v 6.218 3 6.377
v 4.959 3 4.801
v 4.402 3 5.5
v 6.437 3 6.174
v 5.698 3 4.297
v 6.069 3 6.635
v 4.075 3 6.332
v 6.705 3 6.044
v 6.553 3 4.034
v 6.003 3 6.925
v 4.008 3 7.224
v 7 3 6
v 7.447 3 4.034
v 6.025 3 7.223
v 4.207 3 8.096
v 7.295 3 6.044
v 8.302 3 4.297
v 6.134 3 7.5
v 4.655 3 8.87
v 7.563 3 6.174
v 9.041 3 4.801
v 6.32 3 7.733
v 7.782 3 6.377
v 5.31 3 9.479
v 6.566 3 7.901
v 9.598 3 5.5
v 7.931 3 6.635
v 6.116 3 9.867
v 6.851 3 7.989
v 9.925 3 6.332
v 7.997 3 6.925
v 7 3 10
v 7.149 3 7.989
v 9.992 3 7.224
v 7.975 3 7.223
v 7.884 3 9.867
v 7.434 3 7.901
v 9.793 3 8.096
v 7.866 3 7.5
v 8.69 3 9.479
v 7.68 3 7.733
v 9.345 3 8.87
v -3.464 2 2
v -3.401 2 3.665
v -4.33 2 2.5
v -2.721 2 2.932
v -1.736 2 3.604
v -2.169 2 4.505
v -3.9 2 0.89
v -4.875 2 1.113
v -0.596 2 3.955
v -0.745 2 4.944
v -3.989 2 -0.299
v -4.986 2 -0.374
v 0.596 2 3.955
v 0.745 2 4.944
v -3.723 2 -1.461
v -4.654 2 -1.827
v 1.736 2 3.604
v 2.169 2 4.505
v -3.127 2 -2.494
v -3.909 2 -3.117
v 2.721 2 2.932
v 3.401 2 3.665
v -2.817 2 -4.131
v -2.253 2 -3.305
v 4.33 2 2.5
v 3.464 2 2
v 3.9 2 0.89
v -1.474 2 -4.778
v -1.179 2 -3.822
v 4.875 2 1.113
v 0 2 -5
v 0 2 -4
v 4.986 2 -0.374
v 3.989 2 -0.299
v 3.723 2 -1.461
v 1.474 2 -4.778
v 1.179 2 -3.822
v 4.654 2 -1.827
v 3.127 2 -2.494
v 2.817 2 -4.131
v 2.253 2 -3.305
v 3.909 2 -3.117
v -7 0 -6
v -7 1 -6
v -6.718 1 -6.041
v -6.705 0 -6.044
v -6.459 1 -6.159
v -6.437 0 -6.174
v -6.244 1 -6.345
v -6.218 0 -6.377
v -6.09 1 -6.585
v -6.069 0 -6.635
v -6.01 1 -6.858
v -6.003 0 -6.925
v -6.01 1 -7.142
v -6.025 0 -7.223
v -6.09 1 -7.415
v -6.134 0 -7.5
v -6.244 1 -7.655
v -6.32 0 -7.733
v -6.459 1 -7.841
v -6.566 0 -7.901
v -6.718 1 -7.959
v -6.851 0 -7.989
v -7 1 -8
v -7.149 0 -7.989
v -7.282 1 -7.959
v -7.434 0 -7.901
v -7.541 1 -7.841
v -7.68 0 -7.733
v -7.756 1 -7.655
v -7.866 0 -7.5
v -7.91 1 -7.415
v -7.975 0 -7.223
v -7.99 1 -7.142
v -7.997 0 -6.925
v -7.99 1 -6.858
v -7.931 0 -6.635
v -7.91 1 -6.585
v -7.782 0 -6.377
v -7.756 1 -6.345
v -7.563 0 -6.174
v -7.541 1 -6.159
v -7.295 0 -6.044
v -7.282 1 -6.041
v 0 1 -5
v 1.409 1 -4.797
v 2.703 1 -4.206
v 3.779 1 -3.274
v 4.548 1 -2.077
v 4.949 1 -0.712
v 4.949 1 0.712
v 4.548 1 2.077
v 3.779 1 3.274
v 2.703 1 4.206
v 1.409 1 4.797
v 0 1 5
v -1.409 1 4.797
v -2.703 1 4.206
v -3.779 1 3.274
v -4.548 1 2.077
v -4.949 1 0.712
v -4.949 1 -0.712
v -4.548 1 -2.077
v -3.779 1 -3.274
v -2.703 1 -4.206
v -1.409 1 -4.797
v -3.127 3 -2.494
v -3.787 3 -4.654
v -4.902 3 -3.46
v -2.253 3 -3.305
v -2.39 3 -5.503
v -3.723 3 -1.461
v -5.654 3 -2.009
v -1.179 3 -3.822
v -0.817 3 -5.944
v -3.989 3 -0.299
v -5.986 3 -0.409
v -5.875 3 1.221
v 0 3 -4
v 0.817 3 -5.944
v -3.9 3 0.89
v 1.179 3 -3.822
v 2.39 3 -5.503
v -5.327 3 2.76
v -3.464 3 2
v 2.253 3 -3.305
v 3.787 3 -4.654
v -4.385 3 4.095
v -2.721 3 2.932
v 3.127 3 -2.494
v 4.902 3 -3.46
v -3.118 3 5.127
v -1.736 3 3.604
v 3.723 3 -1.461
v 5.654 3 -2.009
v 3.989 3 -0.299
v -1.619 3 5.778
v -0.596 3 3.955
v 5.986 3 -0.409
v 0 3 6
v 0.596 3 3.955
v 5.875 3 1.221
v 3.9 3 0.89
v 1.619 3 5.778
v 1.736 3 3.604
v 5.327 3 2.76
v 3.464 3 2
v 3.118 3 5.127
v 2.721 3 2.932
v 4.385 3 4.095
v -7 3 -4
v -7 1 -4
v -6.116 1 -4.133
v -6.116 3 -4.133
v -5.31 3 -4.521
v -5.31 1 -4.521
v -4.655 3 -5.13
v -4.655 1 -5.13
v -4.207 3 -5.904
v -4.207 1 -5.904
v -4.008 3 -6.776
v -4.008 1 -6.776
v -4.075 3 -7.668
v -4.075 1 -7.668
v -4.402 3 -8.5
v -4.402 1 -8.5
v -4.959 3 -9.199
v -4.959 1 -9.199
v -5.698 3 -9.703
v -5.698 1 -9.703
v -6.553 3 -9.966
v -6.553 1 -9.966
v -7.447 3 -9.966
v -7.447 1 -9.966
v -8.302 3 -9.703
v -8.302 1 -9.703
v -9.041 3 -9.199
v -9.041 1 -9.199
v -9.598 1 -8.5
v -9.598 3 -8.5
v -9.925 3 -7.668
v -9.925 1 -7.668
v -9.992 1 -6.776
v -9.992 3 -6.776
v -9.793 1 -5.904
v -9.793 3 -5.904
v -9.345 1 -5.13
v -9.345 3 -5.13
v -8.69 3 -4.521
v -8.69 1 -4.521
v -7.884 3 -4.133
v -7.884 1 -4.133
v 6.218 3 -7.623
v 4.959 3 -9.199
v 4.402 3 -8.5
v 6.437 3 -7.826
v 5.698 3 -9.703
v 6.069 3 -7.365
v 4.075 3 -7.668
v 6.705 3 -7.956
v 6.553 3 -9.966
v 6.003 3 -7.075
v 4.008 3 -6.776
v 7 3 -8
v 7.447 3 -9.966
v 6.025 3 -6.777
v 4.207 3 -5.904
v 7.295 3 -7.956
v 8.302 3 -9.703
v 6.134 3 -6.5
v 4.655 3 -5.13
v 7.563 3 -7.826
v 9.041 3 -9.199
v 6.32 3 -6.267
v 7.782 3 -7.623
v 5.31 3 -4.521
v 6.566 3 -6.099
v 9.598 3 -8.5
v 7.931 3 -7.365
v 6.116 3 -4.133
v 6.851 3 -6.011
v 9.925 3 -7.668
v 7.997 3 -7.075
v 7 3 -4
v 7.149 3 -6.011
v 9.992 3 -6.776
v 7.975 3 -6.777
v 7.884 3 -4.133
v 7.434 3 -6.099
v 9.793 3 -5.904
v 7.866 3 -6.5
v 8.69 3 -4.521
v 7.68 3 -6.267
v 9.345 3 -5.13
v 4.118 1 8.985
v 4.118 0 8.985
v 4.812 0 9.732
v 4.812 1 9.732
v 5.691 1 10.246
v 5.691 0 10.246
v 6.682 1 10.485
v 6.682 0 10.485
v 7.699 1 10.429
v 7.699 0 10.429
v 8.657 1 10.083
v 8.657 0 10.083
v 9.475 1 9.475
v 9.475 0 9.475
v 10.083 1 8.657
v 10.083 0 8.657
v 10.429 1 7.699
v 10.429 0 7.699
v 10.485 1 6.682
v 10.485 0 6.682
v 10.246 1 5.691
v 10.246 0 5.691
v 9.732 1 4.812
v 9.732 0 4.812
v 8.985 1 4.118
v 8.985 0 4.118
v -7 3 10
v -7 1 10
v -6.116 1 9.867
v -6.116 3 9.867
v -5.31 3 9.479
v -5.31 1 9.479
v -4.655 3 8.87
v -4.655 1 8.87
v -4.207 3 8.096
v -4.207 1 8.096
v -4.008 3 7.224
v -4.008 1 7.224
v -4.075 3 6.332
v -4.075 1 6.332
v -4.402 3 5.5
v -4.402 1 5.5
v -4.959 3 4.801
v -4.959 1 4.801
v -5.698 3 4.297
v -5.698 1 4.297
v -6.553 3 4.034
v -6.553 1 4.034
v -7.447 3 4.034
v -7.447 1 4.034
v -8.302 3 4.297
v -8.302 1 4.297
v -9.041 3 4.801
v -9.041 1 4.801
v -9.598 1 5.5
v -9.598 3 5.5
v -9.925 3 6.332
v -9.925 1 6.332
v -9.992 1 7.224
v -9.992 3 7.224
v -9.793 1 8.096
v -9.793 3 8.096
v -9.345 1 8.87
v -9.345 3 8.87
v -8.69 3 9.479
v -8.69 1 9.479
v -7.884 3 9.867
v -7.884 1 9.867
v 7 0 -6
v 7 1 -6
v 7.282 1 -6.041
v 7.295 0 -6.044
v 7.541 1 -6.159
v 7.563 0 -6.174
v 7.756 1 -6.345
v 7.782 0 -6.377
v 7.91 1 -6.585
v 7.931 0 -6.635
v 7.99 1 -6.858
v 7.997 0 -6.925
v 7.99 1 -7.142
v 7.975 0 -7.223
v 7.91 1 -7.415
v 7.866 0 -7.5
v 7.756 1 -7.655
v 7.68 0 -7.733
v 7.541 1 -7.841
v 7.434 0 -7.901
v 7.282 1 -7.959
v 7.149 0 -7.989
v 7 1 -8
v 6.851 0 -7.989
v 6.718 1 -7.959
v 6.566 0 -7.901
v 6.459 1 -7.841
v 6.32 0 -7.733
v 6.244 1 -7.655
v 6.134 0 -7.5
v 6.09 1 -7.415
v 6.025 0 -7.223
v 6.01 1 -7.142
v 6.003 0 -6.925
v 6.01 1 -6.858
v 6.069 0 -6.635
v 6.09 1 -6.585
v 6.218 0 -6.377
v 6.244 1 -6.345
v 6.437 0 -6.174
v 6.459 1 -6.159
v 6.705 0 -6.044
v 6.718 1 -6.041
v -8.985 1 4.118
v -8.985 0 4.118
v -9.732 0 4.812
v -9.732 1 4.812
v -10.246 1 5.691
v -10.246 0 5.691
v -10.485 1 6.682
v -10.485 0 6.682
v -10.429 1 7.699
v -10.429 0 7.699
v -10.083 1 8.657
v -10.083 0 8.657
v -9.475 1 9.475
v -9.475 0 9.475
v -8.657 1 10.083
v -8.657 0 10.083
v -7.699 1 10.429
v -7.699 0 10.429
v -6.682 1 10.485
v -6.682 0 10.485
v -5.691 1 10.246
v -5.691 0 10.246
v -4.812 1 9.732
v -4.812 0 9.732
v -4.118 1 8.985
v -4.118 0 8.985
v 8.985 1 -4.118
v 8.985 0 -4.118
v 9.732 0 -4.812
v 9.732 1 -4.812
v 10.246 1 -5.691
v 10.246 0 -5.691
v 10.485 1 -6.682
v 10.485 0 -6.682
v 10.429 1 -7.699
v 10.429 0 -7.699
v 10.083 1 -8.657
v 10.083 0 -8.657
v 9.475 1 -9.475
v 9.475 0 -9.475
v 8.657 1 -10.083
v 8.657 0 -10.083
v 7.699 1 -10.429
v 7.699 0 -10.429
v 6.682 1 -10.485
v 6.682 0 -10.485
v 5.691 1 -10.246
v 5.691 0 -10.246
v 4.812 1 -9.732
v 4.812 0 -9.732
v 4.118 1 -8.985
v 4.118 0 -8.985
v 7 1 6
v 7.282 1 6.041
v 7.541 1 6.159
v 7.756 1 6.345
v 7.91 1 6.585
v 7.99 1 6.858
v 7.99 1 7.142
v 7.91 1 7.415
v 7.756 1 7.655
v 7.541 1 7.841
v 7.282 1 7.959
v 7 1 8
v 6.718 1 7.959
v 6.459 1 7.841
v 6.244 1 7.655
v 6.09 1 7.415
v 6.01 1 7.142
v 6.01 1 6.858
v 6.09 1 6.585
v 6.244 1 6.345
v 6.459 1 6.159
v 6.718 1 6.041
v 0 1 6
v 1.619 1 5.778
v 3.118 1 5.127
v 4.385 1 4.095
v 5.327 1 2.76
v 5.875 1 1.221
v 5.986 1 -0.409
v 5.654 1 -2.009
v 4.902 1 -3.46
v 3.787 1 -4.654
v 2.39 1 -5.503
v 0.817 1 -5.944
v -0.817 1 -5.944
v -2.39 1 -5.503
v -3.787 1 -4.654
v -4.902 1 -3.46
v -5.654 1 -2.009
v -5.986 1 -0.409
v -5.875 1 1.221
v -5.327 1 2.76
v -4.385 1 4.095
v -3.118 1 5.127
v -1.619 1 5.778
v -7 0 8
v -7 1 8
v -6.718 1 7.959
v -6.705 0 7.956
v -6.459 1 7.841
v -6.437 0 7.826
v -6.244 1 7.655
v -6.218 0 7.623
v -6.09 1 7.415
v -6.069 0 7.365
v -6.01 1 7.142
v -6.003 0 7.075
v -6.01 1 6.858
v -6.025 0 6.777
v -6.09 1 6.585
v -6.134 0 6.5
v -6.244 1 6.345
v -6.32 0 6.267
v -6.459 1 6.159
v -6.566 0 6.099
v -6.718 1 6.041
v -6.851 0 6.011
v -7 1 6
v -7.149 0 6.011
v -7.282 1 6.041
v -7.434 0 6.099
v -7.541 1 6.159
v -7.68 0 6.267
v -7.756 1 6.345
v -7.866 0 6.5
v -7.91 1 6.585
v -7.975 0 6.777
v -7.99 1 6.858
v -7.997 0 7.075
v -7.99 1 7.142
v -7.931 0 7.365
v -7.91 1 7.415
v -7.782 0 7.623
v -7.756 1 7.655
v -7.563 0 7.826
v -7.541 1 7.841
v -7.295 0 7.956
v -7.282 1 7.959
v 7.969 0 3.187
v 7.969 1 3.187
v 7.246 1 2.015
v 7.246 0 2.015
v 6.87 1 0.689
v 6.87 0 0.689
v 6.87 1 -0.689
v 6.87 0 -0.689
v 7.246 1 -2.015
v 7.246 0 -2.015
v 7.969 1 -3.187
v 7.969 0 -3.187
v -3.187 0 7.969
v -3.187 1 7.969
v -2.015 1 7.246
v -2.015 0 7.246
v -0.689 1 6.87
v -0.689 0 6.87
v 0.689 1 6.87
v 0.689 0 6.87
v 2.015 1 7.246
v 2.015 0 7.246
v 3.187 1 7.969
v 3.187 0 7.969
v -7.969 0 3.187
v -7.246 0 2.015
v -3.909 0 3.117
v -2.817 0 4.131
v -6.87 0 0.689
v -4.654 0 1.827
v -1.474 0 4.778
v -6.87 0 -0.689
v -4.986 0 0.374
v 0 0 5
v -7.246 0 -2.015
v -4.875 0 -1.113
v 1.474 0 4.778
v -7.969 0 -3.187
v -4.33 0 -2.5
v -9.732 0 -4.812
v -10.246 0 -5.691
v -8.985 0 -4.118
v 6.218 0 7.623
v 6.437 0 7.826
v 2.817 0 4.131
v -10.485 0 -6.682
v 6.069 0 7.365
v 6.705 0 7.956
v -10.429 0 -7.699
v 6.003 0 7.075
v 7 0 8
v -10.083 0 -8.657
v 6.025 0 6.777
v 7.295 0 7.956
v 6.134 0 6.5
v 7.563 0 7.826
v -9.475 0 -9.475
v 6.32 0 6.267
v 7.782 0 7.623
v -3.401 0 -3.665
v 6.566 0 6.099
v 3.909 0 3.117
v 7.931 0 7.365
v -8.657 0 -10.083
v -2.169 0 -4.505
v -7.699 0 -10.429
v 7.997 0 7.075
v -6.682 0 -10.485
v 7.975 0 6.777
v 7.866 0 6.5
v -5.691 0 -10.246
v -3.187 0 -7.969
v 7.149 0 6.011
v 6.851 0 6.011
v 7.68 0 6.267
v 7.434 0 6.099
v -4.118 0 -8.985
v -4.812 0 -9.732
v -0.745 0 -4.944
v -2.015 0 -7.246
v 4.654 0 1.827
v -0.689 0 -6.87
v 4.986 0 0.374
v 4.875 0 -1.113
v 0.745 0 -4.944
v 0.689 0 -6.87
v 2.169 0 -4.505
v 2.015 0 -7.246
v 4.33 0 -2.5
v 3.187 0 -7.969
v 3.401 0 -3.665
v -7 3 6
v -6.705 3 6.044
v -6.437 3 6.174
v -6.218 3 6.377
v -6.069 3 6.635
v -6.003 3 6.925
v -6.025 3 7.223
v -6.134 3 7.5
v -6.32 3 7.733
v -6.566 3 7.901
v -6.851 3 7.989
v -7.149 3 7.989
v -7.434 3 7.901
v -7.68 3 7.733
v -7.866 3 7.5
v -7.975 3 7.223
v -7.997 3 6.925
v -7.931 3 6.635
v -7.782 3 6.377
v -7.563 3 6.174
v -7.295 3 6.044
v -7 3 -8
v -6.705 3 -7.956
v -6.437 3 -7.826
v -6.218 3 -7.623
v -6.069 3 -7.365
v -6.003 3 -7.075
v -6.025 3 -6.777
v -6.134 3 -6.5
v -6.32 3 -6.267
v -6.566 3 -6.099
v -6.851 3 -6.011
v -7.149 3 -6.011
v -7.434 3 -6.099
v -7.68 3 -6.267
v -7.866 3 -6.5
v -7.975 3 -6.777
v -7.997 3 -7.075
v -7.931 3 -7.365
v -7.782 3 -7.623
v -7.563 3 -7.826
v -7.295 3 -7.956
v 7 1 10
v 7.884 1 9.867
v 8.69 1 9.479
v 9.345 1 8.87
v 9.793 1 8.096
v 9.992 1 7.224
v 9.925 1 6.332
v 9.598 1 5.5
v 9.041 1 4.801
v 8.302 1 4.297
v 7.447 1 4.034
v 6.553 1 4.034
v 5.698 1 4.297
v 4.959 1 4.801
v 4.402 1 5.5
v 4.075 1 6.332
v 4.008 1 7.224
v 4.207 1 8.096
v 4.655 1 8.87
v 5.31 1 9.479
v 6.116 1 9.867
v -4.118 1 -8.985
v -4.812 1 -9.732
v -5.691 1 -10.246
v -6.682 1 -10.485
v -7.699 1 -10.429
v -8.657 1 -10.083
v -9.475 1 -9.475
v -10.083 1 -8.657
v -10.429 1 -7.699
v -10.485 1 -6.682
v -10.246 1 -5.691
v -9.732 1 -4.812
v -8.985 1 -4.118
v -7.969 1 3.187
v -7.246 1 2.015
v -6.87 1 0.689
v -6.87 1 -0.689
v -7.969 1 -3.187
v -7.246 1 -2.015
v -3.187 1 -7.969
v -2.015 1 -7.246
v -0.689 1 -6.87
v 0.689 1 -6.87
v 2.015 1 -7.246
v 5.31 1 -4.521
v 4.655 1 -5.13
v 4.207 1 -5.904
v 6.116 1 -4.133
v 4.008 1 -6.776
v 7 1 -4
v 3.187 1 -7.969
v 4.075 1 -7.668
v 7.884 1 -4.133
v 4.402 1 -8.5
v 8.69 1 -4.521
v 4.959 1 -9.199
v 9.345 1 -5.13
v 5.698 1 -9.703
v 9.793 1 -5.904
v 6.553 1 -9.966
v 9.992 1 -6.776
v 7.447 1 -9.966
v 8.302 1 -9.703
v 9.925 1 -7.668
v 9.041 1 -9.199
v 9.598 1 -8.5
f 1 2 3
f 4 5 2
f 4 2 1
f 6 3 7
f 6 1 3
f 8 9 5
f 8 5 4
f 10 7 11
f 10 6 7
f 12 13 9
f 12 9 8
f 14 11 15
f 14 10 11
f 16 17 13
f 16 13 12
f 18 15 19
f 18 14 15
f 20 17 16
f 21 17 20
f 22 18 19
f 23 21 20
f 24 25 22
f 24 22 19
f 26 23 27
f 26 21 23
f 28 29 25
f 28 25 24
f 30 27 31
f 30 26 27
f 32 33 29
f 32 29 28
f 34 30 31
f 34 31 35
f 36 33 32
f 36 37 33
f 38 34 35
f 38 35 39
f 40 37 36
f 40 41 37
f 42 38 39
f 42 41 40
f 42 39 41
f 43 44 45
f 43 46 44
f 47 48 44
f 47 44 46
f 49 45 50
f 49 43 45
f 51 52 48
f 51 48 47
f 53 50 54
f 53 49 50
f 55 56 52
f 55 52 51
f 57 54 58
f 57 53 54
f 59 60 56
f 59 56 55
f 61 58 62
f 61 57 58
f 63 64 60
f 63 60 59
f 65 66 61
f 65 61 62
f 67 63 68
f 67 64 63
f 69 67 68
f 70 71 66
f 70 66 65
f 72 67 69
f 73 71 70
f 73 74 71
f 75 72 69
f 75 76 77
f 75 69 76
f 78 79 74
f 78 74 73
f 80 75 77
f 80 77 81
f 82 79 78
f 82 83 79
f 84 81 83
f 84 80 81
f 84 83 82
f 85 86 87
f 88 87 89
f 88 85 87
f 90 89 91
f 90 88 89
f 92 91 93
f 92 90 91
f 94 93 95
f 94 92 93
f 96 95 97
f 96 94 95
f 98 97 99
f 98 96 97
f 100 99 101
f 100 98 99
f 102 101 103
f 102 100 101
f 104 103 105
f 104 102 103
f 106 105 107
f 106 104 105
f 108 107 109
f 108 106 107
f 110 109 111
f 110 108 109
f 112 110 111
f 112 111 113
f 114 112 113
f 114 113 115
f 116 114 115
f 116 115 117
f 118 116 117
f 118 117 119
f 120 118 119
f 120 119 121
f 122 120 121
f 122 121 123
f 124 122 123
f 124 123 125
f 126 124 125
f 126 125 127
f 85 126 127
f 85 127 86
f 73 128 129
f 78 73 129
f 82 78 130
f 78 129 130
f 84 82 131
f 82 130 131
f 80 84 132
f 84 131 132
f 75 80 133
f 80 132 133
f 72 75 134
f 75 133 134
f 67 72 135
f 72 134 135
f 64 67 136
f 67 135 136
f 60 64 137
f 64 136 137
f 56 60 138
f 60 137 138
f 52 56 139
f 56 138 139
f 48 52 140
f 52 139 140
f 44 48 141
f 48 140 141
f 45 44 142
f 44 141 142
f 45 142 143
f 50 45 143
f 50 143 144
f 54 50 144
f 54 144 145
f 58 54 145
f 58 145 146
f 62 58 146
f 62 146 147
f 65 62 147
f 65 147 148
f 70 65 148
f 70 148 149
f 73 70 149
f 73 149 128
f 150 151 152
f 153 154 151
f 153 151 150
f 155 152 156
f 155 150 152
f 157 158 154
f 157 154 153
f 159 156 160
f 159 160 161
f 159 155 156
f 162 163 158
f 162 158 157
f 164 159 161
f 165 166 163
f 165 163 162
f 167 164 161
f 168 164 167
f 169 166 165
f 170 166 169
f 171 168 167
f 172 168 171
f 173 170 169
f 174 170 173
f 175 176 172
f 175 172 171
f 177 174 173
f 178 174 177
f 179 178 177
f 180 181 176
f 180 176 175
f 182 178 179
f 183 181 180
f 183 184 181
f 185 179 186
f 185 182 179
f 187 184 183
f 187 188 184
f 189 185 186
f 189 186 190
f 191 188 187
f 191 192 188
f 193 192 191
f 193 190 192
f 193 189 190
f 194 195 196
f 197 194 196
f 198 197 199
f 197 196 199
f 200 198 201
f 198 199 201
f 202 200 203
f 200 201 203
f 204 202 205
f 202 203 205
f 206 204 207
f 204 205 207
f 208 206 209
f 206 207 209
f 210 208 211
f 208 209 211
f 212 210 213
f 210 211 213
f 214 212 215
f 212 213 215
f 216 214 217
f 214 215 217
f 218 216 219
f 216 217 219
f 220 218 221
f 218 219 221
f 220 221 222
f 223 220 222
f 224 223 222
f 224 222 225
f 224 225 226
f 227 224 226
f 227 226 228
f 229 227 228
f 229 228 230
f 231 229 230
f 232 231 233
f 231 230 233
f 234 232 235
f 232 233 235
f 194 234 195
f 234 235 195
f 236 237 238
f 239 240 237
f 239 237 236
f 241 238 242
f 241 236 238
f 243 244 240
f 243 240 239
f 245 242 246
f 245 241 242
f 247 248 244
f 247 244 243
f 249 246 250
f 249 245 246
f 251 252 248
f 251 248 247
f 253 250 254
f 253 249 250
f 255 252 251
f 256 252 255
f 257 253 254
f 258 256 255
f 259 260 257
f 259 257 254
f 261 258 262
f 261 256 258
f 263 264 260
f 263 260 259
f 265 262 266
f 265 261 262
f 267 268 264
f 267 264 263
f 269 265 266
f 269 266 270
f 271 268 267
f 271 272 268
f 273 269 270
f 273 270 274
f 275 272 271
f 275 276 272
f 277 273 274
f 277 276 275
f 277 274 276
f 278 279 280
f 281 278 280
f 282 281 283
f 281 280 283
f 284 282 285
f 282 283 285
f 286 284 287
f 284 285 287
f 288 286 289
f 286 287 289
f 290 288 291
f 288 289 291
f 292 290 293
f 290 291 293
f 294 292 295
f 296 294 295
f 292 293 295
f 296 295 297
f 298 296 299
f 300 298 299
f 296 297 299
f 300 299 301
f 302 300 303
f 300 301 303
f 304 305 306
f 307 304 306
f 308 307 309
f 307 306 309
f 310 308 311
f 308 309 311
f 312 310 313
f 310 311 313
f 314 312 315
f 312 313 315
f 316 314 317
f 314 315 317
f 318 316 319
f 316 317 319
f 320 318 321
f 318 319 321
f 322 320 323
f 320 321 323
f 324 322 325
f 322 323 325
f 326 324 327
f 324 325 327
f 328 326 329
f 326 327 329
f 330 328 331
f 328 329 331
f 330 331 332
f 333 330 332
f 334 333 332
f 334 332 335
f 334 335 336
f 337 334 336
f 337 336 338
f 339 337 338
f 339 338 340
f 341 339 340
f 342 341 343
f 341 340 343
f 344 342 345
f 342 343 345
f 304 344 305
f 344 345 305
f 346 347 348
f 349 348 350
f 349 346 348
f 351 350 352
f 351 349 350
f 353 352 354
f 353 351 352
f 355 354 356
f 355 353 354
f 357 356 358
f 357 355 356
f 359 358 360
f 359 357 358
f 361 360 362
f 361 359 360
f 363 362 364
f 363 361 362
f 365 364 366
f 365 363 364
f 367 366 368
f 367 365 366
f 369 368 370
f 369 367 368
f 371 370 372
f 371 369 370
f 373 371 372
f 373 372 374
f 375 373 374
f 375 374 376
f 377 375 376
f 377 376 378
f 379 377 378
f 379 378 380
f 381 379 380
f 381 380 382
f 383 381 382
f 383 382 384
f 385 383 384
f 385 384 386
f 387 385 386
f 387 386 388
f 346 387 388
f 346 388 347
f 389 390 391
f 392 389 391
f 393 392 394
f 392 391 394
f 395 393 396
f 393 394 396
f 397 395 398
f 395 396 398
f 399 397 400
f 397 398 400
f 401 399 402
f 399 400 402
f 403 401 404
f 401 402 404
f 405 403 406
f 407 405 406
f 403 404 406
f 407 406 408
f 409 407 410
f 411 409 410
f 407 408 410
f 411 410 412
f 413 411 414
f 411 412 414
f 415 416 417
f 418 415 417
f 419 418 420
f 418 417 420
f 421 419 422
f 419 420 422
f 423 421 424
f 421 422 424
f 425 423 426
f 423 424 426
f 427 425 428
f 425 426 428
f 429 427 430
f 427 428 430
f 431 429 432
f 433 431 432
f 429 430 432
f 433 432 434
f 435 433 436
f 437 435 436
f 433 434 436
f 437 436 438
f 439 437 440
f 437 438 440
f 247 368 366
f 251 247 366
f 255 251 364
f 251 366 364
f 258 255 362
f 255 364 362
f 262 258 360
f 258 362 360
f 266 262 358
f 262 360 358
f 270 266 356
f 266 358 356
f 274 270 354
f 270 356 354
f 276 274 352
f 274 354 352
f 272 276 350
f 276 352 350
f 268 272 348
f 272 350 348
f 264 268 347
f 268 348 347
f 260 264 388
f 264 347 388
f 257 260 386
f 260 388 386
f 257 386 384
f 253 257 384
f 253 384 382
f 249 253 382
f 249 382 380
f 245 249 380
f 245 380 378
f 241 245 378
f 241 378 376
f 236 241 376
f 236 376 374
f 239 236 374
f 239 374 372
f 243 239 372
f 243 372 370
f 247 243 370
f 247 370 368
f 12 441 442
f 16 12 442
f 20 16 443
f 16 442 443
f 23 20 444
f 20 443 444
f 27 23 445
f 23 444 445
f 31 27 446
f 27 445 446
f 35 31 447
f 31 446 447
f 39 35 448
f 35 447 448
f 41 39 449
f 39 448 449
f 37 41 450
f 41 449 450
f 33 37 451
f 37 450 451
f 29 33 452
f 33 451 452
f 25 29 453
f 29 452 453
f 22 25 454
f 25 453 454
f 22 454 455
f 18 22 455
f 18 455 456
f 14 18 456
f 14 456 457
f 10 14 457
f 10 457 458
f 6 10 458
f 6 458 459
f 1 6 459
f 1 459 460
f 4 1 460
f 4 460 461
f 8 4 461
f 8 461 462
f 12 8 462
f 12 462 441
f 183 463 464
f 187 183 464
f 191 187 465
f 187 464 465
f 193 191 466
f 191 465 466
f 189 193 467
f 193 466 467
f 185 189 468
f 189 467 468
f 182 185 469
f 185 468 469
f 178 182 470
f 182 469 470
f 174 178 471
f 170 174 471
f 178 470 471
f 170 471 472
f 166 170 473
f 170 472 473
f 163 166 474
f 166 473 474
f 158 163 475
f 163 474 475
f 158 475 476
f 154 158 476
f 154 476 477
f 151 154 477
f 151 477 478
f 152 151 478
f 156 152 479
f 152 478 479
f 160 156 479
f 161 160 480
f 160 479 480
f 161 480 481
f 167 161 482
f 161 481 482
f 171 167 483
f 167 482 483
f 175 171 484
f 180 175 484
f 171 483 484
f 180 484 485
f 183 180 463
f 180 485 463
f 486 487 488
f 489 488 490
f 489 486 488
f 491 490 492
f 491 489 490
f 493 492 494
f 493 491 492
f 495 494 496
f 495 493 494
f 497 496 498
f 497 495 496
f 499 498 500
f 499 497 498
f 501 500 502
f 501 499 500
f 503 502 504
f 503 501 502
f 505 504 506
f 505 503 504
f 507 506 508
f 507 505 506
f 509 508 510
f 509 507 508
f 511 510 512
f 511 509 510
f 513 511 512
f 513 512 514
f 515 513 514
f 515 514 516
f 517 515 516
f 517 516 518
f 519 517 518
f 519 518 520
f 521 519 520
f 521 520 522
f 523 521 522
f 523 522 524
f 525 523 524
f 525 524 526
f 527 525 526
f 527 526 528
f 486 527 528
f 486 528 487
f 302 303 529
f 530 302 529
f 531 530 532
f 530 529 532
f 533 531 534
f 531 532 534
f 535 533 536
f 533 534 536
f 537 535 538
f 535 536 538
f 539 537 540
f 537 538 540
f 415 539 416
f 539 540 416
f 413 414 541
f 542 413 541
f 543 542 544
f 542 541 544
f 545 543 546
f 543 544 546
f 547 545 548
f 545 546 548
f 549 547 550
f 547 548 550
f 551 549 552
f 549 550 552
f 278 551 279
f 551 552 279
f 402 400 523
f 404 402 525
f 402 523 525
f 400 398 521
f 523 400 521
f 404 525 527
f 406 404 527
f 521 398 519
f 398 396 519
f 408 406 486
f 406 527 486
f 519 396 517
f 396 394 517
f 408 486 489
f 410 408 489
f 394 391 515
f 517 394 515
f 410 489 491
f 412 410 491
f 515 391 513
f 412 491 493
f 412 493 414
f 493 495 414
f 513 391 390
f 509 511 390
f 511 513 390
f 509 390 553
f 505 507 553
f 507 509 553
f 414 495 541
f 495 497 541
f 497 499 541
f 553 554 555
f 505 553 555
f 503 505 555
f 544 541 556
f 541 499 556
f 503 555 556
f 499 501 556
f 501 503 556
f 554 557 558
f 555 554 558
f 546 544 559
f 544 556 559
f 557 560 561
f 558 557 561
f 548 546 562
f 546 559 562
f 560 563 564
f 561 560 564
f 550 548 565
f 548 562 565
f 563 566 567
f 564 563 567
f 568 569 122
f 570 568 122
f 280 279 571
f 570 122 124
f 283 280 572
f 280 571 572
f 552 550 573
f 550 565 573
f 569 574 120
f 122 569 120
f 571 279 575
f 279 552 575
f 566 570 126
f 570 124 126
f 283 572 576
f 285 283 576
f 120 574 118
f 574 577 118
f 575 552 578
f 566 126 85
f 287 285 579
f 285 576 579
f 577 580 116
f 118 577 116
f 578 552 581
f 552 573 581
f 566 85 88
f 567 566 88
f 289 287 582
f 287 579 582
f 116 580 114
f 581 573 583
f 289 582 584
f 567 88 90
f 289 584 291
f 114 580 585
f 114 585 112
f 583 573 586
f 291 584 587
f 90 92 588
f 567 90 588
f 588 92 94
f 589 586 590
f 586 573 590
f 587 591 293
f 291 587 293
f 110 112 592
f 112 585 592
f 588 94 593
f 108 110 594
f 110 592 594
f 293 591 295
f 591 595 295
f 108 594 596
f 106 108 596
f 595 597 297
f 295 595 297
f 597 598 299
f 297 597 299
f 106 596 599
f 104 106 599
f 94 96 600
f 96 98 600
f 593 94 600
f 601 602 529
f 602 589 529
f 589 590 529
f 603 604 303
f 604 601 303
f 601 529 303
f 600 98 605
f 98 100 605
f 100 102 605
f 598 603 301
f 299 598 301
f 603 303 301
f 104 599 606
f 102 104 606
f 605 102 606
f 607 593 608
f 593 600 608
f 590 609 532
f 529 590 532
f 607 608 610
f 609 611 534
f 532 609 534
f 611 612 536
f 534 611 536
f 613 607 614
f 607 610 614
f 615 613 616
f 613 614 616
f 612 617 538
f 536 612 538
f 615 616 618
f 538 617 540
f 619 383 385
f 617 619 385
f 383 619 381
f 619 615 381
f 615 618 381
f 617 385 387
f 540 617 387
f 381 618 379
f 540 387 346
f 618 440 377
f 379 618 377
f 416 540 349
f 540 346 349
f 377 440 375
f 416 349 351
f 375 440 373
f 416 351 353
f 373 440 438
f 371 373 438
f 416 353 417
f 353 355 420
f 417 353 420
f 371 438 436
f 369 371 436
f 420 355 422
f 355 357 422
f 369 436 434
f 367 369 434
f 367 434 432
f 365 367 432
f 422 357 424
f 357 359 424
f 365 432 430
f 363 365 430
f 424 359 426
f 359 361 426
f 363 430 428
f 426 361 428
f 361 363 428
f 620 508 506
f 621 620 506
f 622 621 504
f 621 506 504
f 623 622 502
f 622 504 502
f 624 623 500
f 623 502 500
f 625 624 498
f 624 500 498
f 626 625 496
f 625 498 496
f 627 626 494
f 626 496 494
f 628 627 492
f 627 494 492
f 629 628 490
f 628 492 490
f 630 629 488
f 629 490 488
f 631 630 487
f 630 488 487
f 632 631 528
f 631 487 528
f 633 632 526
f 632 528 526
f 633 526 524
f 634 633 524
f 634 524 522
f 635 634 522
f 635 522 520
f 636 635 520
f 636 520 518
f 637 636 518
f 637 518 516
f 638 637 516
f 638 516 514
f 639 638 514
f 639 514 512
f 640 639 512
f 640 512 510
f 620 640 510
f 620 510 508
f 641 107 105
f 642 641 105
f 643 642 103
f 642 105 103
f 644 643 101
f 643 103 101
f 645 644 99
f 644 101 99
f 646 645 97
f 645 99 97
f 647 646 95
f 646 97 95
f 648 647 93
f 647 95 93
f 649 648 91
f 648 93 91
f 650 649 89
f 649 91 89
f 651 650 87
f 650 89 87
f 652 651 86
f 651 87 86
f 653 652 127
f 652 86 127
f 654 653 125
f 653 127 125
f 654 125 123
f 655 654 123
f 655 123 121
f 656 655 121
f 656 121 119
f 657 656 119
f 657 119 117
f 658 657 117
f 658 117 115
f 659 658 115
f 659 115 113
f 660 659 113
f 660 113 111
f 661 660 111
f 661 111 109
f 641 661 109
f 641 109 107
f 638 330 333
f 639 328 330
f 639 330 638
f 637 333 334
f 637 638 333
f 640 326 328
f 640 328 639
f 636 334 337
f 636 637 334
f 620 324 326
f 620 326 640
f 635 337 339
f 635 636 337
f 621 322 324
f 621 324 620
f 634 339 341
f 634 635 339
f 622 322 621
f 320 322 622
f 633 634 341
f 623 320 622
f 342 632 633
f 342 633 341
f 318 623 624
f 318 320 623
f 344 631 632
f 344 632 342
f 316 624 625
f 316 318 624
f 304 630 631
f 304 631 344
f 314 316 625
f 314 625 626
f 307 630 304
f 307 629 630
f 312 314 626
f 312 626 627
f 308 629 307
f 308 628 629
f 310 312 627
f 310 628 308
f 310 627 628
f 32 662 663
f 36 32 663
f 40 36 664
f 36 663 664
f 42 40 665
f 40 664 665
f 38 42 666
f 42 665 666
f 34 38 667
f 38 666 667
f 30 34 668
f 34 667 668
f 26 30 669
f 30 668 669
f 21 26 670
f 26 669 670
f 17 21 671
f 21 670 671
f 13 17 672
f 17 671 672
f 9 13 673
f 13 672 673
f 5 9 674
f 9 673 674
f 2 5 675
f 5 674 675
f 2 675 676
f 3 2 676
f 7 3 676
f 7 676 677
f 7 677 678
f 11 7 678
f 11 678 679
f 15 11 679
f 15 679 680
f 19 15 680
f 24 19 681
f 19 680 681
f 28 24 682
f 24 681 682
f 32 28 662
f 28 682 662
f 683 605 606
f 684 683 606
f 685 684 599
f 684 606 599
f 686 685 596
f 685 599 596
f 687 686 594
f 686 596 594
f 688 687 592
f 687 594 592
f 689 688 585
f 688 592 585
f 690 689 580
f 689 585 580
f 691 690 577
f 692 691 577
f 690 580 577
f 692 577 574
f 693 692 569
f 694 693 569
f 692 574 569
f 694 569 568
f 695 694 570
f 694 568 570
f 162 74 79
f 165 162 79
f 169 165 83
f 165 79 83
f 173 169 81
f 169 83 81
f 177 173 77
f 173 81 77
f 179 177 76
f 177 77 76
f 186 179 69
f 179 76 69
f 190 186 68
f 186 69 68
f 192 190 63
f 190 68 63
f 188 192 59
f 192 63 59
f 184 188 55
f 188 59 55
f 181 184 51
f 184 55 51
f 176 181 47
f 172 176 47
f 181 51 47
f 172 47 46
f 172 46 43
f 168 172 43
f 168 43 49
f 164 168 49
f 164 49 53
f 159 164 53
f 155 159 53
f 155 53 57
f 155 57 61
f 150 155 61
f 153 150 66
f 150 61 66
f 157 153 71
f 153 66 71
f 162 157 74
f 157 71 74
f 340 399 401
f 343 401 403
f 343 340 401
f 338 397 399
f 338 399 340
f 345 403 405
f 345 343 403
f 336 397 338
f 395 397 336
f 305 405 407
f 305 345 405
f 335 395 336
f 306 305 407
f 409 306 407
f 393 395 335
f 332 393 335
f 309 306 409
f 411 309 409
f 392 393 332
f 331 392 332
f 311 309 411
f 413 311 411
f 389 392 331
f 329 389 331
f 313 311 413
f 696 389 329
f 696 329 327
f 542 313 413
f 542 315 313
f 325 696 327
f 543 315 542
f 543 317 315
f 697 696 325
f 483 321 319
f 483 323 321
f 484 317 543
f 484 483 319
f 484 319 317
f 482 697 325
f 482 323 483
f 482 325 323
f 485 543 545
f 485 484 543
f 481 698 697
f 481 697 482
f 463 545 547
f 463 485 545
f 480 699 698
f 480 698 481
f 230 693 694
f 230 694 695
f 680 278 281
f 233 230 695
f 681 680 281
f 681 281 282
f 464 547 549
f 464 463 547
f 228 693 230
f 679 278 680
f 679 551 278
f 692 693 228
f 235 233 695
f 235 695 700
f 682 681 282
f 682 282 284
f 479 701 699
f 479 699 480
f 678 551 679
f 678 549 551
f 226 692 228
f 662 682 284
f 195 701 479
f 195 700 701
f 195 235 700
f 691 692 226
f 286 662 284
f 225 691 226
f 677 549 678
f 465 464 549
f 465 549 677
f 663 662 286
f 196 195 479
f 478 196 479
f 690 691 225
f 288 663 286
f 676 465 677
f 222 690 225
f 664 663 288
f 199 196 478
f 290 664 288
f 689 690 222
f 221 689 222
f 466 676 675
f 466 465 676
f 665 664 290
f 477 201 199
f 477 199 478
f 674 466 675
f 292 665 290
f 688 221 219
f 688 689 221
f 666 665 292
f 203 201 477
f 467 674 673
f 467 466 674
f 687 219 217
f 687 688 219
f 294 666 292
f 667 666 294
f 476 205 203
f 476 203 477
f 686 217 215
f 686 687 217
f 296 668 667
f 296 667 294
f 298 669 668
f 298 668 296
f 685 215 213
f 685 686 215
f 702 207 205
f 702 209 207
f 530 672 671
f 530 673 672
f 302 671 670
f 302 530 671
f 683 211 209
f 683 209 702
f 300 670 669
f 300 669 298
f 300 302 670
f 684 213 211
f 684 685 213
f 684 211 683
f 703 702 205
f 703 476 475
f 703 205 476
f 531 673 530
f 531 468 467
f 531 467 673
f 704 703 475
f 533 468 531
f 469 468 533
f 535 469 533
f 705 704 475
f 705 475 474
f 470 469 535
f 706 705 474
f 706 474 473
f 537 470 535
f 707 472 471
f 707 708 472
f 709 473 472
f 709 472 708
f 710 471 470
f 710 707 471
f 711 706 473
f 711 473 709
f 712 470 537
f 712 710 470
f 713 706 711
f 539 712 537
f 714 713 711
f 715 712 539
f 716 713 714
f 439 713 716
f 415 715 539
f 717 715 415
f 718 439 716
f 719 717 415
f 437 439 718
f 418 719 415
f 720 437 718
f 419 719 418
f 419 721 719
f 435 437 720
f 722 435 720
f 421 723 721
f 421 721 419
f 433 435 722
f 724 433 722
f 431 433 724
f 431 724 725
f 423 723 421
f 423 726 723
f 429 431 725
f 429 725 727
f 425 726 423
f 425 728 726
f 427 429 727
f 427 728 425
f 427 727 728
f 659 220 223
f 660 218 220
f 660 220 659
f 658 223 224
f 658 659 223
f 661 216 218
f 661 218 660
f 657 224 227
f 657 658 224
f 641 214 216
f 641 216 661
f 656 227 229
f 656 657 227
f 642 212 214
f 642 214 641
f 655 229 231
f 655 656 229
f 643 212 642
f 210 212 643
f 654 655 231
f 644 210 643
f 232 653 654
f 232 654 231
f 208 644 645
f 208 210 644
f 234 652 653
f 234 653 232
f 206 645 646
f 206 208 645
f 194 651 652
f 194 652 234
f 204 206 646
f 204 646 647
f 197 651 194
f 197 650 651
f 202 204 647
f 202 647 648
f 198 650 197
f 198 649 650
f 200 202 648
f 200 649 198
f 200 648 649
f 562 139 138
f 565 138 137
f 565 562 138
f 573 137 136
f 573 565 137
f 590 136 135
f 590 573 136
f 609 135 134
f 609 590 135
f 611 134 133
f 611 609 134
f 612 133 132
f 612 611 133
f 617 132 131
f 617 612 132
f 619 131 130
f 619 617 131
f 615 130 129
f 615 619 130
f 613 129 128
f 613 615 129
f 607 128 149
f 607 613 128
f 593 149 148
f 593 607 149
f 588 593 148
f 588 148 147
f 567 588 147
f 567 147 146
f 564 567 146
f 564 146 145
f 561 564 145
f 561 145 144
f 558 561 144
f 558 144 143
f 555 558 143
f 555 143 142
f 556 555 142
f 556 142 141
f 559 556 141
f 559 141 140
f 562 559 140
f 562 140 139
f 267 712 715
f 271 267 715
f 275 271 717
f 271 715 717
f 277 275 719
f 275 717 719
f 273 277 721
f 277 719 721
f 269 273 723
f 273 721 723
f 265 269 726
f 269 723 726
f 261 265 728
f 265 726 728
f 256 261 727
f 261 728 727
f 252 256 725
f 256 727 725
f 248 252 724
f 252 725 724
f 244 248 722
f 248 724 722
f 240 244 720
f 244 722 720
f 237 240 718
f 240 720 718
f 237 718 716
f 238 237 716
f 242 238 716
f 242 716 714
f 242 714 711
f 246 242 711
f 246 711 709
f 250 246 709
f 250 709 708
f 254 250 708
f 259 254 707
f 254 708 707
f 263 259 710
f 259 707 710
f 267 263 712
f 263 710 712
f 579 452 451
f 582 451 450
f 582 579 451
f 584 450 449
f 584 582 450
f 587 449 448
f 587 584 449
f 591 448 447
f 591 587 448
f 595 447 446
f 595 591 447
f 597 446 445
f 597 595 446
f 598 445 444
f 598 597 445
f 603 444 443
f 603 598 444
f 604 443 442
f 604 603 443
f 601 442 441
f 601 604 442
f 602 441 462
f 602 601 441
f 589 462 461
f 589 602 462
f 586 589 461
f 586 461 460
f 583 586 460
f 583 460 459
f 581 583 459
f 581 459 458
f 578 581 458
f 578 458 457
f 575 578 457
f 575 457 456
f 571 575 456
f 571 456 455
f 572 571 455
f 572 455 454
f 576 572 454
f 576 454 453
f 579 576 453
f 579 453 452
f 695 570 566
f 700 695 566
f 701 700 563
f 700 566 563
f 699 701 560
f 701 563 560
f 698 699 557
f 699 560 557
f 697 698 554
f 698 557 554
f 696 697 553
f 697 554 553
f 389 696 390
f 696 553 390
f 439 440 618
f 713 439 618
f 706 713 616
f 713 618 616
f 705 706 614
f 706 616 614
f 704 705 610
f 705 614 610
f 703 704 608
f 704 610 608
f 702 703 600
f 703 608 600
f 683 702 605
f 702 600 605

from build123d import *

# Parameters (mm, degrees)
SKETCH1_R           = 1
SKETCH1_R_2         = 5
BOSS_EXTRUDE1_DEPTH = 1
SKETCH3_R           = 6
BOSS_EXTRUDE2_DEPTH = 2
SKETCH4_R           = 5
CUT_EXTRUDE1_DEPTH  = 1
SKETCH5_R           = 4
CUT_EXTRUDE2_DEPTH  = 1
SKETCH6_R           = 3
BOSS_EXTRUDE3_DEPTH = 2
SKETCH7_R           = 1
CUT_EXTRUDE3_DEPTH  = 2


with BuildPart() as part:
    # Sketch1 → Boss-Extrude1 (new body)
    with BuildSketch(Plane(origin=(0, 0, 0), x_dir=(1, 0, 0), z_dir=(0, 1, 0))):
        with BuildLine():
            ThreePointArc((4.117647059, 8.98545751), (0, 6.82182538), (-4.117647059, 8.98545751))
            ThreePointArc((-4.117647059, 8.98545751), (-9.474873734, 9.474873734), (-8.98545751, 4.117647059))
            ThreePointArc((-8.98545751, 4.117647059), (-6.82182538, 0), (-8.98545751, -4.117647059))
            ThreePointArc((-8.98545751, -4.117647059), (-9.474873734, -9.474873734), (-4.117647059, -8.98545751))
            ThreePointArc((-4.117647059, -8.98545751), (0, -6.82182538), (4.117647059, -8.98545751))
            ThreePointArc((4.117647059, -8.98545751), (9.474873734, -9.474873734), (8.98545751, -4.117647059))
            ThreePointArc((8.98545751, -4.117647059), (6.82182538, 0), (8.98545751, 4.117647059))
            ThreePointArc((8.98545751, 4.117647059), (9.474873734, 9.474873734), (4.117647059, 8.98545751))
        make_face()
        with Locations((-7, -7)):
            Circle(SKETCH1_R, mode=Mode.SUBTRACT)
        Circle(SKETCH1_R_2, mode=Mode.SUBTRACT)
        with Locations((7, -7)):
            Circle(SKETCH1_R, mode=Mode.SUBTRACT)
        with Locations((-7, 7)):
            Circle(SKETCH1_R, mode=Mode.SUBTRACT)
        with Locations((7, 7)):
            Circle(SKETCH1_R, mode=Mode.SUBTRACT)
    extrude(amount=BOSS_EXTRUDE1_DEPTH)

    # Sketch3 → Boss-Extrude2 (add)
    with BuildSketch(Plane(origin=(0, 1, 0), x_dir=(1, 0, 0), z_dir=(0, 1, 0))):
        Circle(SKETCH3_R)
    extrude(amount=BOSS_EXTRUDE2_DEPTH)

    # Sketch4 → Cut-Extrude1 (cut)
    with BuildSketch(Plane.XZ.offset(-1)):
        Circle(SKETCH4_R)
    extrude(amount=-CUT_EXTRUDE1_DEPTH, mode=Mode.SUBTRACT)

    # Sketch5 → Cut-Extrude2 (cut)
    with BuildSketch(Plane.XZ.offset(-2)):
        Circle(SKETCH5_R)
    extrude(amount=-CUT_EXTRUDE2_DEPTH, mode=Mode.SUBTRACT)

    # Sketch6 → Boss-Extrude3 (add)
    with BuildSketch(Plane(origin=(0, 1, 0), x_dir=(1, 0, 0), z_dir=(0, 1, 0))):
        with Locations((-7, 7)):
            Circle(SKETCH6_R)
        with Locations((7, 7)):
            Circle(SKETCH6_R)
        with Locations((7, -7)):
            Circle(SKETCH6_R)
        with Locations((-7, -7)):
            Circle(SKETCH6_R)
    extrude(amount=BOSS_EXTRUDE3_DEPTH)

    # Sketch7 → Cut-Extrude3 (cut)
    with BuildSketch(Plane.XZ.offset(-1)):
        with Locations((-7, 7)):
            Circle(SKETCH7_R)
        with Locations((7, 7)):
            Circle(SKETCH7_R)
        with Locations((7, -7)):
            Circle(SKETCH7_R)
        with Locations((-7, -7)):
            Circle(SKETCH7_R)
    extrude(amount=-CUT_EXTRUDE3_DEPTH, mode=Mode.SUBTRACT)


solid = part.part
